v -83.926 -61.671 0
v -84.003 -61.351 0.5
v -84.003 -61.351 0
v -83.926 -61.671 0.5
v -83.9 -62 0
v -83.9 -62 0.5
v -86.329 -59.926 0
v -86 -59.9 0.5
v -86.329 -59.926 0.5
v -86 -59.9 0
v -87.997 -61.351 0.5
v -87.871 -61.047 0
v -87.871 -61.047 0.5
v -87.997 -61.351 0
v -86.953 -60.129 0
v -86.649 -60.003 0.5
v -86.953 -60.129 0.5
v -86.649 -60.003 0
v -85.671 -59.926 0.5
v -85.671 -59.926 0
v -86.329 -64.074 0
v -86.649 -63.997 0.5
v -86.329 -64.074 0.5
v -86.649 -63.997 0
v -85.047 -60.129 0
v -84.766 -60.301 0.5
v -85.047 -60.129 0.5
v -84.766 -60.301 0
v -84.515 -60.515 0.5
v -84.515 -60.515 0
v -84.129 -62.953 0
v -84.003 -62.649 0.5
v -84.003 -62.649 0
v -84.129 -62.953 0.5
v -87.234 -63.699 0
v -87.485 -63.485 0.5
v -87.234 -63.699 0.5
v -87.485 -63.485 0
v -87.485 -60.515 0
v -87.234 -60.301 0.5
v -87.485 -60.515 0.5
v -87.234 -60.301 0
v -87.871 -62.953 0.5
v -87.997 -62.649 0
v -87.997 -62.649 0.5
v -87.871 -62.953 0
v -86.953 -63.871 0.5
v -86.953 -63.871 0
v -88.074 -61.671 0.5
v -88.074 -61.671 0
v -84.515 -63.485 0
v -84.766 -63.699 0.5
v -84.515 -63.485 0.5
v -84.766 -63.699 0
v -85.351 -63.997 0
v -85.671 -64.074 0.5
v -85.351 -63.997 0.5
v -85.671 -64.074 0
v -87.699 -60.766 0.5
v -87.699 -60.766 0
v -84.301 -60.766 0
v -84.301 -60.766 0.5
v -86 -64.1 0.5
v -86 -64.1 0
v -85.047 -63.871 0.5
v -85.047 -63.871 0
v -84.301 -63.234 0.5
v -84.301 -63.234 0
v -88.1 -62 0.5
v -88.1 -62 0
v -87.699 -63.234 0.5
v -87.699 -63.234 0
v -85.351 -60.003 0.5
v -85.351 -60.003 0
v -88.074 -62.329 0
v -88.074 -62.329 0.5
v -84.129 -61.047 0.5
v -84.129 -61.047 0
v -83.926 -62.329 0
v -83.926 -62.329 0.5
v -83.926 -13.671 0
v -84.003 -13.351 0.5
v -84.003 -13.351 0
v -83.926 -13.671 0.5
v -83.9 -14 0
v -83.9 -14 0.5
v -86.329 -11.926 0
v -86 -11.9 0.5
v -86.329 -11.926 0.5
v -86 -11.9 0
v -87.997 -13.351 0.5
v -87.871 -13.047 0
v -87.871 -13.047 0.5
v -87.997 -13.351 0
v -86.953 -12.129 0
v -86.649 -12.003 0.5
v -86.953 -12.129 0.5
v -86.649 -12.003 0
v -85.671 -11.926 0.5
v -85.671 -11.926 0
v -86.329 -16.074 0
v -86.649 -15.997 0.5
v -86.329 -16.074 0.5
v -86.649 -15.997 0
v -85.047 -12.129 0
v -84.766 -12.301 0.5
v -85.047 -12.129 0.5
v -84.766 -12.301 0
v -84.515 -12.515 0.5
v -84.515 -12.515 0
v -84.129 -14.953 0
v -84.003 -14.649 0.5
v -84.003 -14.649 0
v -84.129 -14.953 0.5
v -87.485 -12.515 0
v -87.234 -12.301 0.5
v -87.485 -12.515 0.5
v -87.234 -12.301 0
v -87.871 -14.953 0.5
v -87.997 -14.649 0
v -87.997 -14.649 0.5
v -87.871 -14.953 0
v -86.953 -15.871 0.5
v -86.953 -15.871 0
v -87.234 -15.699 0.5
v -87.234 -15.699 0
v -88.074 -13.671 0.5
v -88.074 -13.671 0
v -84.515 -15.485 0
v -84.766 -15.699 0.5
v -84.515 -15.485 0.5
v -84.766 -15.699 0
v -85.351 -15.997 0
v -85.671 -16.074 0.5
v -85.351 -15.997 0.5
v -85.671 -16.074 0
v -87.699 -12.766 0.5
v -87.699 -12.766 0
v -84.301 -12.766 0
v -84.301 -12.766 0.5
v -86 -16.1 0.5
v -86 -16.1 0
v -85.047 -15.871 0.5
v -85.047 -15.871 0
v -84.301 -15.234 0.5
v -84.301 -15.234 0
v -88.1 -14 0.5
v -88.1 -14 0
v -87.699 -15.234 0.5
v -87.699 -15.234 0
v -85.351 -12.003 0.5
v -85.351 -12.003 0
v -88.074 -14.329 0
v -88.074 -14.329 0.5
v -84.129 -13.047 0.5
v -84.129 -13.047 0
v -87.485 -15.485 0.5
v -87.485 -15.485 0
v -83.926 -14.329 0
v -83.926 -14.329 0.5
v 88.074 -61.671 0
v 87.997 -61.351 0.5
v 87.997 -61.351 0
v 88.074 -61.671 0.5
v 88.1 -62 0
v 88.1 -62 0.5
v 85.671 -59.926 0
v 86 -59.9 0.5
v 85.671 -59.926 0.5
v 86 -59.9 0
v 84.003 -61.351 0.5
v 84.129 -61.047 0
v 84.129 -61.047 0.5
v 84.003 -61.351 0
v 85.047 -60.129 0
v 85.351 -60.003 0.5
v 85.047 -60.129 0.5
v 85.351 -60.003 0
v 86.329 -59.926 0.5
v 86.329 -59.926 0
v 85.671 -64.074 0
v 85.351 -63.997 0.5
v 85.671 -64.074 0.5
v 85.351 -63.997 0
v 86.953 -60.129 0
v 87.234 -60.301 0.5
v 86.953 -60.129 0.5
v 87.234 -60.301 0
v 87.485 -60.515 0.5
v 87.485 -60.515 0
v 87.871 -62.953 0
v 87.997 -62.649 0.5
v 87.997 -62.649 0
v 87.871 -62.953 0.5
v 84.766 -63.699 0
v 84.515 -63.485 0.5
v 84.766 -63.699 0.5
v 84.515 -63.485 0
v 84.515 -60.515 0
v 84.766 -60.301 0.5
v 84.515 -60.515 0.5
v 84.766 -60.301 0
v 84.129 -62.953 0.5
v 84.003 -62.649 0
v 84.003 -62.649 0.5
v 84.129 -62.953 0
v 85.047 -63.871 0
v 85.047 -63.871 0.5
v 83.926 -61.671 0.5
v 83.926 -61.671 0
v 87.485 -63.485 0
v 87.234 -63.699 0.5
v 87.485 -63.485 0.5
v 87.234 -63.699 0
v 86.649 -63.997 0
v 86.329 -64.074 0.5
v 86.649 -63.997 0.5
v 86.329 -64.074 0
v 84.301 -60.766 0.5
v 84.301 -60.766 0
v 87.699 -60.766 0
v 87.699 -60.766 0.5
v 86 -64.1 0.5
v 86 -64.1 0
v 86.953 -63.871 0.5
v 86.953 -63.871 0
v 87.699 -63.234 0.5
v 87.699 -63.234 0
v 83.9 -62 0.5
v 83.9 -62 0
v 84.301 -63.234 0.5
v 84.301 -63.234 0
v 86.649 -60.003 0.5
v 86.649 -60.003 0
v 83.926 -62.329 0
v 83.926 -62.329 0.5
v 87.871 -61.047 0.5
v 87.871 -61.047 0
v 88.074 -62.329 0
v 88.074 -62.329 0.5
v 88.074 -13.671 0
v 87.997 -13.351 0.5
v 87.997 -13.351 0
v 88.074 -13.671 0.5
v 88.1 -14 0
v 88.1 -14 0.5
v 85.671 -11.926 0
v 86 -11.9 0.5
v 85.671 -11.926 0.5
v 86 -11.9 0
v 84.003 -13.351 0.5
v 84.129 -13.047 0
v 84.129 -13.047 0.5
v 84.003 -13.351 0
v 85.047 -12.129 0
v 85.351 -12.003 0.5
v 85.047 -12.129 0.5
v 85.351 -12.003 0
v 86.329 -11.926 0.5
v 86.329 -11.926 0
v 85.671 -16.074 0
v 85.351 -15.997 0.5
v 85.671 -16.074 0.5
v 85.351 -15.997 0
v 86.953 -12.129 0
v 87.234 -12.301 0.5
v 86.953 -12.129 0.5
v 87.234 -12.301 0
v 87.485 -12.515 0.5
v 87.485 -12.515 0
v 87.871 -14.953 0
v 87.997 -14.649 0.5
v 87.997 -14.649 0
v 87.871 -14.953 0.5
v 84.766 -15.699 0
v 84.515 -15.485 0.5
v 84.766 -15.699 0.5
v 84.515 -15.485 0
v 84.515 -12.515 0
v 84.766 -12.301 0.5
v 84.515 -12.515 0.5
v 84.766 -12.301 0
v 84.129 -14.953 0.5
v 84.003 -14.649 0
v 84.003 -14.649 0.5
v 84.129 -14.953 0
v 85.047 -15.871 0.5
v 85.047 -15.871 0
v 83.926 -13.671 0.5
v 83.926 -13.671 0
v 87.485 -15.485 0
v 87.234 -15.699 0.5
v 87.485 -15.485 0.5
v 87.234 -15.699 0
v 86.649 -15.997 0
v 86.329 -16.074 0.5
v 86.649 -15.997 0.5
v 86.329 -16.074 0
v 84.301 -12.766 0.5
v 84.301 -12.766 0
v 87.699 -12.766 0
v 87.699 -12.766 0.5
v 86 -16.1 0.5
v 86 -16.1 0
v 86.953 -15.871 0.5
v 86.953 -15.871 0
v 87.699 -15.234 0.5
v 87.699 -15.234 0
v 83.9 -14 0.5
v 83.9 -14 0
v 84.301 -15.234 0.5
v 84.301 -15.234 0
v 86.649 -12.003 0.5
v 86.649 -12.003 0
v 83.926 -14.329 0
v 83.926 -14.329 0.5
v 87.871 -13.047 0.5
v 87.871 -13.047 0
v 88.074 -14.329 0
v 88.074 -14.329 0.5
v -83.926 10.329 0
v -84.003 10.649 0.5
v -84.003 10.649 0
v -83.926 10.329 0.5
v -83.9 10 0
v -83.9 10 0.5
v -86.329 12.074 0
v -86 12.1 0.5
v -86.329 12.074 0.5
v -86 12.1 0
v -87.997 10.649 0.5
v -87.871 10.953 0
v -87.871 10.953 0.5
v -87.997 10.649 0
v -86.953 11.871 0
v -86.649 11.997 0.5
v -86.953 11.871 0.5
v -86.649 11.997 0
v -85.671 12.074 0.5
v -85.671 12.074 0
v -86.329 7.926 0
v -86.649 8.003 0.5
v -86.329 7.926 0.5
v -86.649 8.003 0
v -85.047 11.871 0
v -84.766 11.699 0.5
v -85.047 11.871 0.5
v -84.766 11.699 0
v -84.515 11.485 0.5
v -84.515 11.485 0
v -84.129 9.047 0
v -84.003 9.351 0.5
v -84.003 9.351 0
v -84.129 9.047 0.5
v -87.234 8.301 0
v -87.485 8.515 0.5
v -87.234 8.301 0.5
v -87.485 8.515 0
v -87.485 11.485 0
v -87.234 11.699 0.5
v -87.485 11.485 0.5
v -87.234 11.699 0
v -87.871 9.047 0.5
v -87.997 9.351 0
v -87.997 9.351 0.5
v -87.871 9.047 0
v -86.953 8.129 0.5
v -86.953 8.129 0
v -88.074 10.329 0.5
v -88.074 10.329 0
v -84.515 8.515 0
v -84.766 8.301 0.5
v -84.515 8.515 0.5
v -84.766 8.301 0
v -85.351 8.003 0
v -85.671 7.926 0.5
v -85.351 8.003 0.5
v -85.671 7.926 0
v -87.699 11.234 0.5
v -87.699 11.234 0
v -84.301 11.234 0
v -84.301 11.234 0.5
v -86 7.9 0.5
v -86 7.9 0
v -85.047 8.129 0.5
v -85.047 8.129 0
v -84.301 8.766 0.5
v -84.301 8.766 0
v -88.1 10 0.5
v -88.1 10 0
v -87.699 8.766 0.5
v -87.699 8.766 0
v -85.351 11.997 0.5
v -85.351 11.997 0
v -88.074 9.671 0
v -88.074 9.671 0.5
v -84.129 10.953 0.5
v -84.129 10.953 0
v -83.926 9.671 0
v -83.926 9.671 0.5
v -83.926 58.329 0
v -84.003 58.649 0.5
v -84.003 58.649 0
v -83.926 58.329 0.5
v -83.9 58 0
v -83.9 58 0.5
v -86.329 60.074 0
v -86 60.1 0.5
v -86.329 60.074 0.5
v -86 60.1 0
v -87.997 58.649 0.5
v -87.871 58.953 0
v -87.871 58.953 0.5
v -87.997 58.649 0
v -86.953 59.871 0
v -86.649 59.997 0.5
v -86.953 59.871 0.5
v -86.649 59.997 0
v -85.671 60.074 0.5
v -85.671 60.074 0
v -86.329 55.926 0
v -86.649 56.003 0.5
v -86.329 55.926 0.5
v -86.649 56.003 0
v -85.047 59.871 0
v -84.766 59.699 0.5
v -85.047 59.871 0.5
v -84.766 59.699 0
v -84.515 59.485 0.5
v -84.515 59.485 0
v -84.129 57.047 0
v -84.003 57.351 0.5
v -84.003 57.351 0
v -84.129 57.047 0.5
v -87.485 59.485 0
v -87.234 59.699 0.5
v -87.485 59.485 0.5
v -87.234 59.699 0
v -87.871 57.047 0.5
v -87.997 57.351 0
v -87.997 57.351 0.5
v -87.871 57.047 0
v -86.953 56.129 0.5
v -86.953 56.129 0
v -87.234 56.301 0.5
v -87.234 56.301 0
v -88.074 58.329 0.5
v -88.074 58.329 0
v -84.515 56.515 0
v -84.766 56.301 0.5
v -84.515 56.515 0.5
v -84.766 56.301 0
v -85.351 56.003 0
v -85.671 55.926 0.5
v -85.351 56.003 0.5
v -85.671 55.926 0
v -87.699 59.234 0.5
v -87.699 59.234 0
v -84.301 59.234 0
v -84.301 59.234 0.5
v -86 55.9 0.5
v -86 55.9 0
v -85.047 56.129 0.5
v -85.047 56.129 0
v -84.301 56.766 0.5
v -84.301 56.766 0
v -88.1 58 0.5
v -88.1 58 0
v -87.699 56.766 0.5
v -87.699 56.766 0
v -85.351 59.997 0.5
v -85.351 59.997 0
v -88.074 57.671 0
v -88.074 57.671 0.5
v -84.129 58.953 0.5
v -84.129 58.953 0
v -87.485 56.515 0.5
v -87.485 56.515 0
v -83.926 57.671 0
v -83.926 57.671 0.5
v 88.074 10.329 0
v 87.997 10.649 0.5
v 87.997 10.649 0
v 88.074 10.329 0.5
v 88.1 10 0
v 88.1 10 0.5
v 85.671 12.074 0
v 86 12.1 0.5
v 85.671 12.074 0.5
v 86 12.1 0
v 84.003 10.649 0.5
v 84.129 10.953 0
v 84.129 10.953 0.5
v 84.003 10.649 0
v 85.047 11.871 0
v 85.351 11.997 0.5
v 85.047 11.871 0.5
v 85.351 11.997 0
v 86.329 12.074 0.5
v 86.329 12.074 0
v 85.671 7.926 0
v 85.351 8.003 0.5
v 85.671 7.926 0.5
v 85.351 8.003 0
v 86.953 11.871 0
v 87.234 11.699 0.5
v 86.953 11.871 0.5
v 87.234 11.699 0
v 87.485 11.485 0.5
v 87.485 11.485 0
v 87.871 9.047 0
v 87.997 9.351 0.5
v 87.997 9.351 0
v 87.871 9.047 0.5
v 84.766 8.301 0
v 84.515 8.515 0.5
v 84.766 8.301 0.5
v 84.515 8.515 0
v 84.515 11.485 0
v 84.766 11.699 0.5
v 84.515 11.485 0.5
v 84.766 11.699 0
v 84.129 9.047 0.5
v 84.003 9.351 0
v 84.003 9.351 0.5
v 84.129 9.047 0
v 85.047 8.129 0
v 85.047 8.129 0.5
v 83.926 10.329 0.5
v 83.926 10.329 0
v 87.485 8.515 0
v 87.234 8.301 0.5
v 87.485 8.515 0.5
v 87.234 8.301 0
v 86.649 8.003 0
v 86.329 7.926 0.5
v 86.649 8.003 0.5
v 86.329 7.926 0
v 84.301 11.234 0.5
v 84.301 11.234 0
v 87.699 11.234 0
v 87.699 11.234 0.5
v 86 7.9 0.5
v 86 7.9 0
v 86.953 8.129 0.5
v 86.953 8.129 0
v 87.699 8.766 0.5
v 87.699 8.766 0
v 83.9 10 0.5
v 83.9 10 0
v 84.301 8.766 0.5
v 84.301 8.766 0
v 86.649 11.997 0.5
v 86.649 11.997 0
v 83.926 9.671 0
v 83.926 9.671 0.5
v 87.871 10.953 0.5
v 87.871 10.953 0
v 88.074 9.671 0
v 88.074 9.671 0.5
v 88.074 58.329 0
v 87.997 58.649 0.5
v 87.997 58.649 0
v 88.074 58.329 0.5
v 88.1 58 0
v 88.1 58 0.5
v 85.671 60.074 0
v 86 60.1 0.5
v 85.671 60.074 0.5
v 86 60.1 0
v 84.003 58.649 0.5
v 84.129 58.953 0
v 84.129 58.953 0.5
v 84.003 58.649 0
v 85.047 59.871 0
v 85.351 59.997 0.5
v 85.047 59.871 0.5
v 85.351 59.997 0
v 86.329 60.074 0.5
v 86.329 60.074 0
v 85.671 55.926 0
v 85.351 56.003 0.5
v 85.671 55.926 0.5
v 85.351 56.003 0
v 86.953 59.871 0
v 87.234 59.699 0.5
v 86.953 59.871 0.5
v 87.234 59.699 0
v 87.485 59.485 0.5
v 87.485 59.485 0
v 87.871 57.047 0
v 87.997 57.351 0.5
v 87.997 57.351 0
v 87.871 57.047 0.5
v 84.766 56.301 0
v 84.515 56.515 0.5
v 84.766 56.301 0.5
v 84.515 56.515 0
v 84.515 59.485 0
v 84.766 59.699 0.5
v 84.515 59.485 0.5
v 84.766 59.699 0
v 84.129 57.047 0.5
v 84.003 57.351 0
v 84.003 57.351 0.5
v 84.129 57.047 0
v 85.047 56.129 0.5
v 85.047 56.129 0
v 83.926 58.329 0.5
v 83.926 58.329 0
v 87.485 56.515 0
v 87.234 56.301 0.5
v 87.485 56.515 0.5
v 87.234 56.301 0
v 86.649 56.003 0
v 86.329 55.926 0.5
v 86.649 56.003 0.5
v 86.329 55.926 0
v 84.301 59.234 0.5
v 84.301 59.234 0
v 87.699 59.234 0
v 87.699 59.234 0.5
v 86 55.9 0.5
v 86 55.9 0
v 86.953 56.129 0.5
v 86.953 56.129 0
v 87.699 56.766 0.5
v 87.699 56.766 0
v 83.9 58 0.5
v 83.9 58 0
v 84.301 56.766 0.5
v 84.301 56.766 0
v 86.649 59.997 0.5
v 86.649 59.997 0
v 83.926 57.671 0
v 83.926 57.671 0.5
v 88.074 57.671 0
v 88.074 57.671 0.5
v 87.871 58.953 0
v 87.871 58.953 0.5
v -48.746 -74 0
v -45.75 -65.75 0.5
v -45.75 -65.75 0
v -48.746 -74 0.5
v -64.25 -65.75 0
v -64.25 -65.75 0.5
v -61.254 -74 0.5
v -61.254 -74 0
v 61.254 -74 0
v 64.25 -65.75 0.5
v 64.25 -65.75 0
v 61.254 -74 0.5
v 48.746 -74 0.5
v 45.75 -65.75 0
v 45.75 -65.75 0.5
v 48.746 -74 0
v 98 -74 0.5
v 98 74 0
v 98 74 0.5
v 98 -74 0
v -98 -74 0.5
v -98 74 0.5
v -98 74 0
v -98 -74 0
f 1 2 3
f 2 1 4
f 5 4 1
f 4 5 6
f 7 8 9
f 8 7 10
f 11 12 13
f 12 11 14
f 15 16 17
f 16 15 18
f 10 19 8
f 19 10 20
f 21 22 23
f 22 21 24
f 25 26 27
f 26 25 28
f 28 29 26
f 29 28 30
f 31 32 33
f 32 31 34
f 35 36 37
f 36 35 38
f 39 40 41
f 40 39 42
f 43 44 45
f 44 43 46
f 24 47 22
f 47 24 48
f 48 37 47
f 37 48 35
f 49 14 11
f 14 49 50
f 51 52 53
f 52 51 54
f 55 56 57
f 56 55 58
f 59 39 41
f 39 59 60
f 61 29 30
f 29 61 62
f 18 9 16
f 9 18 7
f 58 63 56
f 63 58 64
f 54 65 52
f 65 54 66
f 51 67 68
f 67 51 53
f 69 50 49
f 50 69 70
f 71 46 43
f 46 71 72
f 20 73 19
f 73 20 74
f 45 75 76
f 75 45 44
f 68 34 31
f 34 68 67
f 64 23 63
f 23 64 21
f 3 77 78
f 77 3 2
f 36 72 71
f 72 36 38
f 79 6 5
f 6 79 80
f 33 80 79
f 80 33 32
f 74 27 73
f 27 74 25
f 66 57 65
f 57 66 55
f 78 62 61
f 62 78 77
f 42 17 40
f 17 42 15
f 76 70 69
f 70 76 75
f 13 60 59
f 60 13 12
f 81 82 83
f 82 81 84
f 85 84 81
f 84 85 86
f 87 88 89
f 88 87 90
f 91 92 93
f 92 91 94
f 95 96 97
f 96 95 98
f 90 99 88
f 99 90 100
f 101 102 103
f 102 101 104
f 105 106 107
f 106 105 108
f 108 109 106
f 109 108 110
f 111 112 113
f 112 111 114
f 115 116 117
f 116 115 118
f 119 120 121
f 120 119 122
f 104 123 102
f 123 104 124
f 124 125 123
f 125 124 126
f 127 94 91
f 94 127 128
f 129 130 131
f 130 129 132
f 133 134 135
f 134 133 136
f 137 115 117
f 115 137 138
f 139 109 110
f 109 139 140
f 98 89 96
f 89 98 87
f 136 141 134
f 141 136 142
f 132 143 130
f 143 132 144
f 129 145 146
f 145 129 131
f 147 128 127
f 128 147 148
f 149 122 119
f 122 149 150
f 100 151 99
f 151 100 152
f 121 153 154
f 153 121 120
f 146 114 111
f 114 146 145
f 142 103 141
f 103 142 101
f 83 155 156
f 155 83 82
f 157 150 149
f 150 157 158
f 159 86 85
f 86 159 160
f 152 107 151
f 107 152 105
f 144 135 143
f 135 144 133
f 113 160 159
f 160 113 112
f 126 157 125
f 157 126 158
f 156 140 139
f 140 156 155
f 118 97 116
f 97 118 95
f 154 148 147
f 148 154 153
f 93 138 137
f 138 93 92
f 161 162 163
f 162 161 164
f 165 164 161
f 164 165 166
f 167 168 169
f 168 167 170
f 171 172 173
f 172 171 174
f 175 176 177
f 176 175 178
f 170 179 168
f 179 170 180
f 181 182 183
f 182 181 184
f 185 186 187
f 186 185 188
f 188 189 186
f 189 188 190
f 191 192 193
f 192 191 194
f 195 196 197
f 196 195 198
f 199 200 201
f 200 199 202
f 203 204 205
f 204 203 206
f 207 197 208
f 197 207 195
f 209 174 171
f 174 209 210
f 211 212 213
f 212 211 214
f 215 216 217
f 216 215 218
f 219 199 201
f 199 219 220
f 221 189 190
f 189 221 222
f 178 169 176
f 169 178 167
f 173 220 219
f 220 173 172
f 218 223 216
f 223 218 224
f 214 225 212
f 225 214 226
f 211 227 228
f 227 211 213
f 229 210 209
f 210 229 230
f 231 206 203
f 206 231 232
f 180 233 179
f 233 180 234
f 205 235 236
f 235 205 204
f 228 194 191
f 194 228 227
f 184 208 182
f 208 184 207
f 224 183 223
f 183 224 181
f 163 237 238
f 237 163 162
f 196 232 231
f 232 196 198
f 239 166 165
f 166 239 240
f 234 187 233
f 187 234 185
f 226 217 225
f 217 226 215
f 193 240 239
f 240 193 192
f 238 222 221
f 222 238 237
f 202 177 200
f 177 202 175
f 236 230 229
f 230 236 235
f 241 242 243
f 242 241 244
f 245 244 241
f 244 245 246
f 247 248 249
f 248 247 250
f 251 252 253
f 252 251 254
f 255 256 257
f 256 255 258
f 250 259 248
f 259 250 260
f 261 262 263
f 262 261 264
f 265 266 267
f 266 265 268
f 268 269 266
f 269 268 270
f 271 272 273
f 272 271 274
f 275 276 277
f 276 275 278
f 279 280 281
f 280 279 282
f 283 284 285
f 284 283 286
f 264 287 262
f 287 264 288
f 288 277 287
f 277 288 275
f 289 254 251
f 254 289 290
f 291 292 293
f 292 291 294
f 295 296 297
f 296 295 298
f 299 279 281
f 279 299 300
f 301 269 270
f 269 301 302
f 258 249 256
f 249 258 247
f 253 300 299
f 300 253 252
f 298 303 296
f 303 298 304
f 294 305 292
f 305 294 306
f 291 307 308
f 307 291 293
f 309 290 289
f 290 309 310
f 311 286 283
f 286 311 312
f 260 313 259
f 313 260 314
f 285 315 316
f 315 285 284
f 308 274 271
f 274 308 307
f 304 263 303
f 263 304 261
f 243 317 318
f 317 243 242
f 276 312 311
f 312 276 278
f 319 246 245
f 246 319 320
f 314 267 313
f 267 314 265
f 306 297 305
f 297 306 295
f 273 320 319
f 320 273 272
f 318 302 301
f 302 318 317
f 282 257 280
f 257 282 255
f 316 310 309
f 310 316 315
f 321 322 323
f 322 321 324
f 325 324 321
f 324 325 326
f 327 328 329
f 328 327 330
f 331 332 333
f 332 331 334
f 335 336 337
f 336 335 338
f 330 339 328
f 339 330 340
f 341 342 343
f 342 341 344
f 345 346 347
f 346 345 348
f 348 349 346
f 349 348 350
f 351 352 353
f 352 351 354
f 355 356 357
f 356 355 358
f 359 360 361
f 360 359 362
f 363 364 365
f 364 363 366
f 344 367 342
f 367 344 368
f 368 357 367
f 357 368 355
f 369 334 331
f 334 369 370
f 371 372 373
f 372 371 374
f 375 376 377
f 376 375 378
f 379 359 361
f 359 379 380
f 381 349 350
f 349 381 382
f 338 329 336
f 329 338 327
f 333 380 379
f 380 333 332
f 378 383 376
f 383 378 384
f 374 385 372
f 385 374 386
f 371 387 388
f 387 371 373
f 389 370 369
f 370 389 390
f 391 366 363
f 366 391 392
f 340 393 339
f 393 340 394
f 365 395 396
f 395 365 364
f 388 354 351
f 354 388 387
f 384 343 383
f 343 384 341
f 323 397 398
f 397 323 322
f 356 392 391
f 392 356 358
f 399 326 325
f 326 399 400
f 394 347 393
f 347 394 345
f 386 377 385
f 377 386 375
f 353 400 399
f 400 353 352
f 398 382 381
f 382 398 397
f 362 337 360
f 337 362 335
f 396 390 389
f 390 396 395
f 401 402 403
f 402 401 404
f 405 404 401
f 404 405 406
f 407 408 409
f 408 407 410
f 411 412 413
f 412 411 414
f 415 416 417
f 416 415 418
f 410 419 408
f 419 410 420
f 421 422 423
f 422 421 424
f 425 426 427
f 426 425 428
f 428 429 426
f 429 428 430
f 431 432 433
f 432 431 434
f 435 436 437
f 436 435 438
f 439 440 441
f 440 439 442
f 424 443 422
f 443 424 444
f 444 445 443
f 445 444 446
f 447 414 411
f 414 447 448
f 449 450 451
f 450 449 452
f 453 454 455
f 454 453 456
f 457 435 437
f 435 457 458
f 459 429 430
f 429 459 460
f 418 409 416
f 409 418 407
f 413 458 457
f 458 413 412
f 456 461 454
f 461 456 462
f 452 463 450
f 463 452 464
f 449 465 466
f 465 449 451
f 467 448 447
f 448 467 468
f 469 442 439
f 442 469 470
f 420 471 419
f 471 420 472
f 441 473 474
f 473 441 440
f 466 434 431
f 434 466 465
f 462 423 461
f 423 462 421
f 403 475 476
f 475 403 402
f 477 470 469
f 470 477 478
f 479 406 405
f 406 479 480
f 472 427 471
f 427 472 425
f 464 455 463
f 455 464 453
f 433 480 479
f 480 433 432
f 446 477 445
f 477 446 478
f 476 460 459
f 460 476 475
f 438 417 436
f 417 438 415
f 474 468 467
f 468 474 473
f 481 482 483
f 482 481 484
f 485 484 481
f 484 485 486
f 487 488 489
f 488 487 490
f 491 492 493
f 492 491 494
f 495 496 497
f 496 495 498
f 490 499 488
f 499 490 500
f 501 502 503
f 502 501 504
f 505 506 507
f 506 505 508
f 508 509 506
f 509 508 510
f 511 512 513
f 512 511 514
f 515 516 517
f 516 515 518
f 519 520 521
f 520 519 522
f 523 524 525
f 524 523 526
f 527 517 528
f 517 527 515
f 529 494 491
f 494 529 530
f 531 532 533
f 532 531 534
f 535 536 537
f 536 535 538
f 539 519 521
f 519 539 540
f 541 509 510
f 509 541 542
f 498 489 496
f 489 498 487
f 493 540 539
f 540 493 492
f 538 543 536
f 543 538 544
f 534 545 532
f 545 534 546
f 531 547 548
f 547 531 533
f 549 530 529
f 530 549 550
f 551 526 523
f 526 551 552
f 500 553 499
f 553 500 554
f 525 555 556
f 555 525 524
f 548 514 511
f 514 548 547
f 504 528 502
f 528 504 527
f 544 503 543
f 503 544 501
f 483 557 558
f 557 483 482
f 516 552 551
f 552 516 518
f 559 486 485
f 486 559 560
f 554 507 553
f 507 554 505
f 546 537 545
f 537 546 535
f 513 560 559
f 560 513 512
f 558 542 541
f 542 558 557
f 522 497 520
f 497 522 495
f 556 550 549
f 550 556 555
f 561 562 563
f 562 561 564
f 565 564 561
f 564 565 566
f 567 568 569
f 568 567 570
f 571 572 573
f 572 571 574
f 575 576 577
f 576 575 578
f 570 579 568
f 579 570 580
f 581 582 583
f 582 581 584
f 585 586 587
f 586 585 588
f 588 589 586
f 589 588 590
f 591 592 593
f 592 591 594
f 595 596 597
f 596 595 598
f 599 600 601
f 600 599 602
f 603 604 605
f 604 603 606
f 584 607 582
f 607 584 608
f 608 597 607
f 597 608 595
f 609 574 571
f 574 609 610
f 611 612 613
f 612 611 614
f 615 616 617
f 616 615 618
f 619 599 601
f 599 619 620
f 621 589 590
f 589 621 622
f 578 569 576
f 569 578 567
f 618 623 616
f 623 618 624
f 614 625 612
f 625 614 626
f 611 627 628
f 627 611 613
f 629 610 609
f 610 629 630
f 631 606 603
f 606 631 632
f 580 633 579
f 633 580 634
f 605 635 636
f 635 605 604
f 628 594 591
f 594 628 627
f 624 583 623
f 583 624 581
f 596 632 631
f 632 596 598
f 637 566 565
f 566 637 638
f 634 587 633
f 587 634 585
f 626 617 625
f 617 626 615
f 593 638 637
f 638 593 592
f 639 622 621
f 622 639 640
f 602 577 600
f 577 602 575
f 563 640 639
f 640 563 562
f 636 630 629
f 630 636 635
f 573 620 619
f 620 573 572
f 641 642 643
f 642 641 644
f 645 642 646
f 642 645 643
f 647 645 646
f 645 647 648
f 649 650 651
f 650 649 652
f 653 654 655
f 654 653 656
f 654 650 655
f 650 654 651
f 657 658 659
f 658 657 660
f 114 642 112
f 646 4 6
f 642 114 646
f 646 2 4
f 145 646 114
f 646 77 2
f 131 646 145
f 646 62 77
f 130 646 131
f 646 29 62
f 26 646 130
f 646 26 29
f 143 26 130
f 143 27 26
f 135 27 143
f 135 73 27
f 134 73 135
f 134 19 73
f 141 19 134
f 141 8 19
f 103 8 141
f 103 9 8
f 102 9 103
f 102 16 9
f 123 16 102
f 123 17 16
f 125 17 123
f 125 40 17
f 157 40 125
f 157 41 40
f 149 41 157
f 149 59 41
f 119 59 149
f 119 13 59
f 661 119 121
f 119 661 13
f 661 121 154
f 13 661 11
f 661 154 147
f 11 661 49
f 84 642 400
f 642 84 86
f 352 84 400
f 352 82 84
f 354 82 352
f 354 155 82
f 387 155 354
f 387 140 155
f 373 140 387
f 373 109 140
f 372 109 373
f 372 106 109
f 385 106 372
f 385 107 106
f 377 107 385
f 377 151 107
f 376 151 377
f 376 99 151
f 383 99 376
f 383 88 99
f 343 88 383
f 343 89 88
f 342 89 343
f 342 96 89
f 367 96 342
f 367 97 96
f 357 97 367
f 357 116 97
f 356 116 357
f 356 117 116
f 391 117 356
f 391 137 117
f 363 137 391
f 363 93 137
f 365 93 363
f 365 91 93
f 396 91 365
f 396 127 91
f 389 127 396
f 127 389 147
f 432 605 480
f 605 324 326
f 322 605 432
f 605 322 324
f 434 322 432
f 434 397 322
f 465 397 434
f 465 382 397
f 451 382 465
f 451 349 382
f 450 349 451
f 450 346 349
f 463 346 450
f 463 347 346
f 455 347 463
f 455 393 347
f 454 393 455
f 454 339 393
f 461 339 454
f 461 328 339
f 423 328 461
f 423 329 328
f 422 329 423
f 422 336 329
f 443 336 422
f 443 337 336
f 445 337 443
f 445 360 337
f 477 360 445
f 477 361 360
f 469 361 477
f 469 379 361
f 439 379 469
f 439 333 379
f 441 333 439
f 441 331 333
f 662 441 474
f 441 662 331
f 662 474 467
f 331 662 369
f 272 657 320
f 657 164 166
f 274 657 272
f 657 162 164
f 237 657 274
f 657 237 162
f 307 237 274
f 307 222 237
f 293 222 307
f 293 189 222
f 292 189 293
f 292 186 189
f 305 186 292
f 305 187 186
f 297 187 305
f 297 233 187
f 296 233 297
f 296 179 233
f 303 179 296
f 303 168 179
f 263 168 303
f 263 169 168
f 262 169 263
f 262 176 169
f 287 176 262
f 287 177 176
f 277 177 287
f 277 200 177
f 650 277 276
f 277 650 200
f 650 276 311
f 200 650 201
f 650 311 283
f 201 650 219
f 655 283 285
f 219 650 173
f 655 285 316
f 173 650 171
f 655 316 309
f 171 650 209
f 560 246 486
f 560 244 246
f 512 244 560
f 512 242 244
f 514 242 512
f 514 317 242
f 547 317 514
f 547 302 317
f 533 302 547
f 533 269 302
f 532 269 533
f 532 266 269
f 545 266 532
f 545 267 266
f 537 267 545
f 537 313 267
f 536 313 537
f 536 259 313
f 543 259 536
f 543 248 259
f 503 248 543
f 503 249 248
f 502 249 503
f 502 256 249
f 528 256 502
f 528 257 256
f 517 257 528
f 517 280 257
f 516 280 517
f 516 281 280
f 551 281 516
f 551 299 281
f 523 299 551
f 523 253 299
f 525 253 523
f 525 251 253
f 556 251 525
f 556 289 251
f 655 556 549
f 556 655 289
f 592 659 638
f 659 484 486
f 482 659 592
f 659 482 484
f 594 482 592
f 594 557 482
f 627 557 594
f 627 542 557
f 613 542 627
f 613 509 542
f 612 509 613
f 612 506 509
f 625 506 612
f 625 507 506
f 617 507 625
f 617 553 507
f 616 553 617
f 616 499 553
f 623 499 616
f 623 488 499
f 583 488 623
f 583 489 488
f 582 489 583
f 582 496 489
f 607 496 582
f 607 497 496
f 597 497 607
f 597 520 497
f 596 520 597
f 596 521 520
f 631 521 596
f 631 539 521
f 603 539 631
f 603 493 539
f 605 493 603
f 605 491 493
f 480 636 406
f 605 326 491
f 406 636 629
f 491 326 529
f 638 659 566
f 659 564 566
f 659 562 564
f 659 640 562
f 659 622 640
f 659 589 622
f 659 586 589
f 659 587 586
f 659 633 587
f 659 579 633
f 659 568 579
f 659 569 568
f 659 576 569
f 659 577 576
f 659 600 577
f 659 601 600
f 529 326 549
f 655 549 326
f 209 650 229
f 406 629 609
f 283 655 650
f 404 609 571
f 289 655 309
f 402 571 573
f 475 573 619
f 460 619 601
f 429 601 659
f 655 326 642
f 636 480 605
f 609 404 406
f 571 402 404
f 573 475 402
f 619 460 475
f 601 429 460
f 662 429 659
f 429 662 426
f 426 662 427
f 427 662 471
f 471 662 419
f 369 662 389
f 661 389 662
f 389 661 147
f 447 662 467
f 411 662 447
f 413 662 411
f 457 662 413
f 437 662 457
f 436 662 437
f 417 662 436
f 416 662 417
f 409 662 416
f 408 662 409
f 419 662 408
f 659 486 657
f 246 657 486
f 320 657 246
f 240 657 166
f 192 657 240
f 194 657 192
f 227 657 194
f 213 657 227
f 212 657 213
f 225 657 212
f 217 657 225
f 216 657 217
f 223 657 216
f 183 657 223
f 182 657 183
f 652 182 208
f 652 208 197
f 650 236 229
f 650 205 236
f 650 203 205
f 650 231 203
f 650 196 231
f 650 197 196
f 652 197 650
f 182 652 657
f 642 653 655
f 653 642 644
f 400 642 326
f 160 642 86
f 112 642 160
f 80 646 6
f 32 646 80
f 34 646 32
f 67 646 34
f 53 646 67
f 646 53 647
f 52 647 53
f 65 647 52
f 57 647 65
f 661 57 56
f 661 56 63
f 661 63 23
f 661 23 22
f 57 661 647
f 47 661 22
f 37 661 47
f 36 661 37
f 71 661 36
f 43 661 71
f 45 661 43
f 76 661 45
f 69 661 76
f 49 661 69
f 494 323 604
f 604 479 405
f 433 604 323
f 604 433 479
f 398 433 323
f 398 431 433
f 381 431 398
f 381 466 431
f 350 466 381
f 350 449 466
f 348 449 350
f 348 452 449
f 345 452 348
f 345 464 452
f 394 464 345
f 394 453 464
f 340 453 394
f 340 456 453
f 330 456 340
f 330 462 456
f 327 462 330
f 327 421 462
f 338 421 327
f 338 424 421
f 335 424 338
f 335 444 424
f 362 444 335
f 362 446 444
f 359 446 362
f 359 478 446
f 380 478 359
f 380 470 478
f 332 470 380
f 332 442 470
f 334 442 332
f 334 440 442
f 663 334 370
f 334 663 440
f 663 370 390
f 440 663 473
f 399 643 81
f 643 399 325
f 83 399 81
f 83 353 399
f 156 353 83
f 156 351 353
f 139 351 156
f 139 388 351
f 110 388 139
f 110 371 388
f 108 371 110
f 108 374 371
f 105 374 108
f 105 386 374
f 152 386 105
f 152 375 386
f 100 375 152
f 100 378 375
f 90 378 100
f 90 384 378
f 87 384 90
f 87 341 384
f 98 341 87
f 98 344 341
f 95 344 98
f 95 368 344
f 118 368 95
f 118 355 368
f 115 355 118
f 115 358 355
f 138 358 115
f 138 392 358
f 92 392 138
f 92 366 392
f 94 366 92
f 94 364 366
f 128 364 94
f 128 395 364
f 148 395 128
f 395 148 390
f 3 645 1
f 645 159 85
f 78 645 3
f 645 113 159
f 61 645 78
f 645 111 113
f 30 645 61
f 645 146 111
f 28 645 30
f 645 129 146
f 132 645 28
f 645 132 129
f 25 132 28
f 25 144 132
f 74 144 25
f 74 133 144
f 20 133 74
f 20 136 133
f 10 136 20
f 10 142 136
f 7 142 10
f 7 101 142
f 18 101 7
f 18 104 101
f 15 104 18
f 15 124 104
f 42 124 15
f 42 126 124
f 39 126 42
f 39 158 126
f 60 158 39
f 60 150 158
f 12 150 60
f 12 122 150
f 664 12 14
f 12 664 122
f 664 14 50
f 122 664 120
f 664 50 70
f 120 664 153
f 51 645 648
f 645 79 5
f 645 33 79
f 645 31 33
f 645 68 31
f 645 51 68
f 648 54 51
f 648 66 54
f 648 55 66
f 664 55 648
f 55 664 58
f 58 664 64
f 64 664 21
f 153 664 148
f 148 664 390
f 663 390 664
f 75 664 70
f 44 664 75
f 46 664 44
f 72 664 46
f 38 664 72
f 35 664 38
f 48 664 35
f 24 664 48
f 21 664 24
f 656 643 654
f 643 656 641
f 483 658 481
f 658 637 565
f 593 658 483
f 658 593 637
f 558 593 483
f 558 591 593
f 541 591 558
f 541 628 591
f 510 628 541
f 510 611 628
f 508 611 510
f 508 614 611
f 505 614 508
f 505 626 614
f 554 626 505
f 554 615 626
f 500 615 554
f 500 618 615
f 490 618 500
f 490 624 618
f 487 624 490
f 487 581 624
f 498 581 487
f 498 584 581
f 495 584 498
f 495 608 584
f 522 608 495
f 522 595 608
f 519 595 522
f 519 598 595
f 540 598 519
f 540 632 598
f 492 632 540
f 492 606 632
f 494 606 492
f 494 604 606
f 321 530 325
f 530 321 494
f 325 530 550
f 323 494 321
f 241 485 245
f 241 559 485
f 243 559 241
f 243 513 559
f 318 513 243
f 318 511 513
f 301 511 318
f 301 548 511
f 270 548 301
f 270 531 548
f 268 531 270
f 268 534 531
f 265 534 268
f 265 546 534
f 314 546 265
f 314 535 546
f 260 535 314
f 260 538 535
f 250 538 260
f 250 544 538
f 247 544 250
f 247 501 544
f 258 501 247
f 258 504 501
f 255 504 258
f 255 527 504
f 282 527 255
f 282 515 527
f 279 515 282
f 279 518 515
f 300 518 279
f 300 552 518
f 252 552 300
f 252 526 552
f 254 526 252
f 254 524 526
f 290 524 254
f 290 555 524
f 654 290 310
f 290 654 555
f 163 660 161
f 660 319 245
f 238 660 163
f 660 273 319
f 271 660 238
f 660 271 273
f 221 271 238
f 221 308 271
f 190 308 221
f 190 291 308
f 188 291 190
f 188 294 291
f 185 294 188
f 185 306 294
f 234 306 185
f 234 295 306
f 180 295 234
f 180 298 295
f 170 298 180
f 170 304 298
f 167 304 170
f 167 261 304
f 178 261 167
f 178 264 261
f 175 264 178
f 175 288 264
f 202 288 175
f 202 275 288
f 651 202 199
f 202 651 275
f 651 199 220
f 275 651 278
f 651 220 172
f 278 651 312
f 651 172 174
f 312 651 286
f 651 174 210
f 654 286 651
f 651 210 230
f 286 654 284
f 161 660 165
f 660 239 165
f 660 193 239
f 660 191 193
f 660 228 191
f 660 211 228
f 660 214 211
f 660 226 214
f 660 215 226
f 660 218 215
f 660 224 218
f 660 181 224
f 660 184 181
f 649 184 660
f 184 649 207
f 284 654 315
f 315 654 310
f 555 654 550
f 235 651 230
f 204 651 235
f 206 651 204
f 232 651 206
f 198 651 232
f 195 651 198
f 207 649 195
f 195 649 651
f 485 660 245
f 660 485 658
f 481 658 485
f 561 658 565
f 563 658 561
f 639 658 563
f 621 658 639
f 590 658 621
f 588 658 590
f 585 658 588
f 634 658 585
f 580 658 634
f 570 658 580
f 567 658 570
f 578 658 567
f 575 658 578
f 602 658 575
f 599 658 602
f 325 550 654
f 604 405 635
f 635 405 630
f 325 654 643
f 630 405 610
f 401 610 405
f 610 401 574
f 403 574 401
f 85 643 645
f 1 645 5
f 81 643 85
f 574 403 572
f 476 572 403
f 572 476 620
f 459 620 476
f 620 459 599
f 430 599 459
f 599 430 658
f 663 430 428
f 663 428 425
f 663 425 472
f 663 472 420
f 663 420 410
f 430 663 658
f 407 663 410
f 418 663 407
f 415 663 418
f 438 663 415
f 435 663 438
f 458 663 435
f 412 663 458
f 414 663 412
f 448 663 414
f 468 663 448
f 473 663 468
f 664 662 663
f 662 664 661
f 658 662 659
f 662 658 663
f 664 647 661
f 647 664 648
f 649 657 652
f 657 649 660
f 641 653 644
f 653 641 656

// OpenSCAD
include <../lib/filament-spool-roller-lib.scad>;
$fn = 40;

// Print plate 9: the floor drilling template, right half.
color("#ff17c7") plate_floor_template(1);
